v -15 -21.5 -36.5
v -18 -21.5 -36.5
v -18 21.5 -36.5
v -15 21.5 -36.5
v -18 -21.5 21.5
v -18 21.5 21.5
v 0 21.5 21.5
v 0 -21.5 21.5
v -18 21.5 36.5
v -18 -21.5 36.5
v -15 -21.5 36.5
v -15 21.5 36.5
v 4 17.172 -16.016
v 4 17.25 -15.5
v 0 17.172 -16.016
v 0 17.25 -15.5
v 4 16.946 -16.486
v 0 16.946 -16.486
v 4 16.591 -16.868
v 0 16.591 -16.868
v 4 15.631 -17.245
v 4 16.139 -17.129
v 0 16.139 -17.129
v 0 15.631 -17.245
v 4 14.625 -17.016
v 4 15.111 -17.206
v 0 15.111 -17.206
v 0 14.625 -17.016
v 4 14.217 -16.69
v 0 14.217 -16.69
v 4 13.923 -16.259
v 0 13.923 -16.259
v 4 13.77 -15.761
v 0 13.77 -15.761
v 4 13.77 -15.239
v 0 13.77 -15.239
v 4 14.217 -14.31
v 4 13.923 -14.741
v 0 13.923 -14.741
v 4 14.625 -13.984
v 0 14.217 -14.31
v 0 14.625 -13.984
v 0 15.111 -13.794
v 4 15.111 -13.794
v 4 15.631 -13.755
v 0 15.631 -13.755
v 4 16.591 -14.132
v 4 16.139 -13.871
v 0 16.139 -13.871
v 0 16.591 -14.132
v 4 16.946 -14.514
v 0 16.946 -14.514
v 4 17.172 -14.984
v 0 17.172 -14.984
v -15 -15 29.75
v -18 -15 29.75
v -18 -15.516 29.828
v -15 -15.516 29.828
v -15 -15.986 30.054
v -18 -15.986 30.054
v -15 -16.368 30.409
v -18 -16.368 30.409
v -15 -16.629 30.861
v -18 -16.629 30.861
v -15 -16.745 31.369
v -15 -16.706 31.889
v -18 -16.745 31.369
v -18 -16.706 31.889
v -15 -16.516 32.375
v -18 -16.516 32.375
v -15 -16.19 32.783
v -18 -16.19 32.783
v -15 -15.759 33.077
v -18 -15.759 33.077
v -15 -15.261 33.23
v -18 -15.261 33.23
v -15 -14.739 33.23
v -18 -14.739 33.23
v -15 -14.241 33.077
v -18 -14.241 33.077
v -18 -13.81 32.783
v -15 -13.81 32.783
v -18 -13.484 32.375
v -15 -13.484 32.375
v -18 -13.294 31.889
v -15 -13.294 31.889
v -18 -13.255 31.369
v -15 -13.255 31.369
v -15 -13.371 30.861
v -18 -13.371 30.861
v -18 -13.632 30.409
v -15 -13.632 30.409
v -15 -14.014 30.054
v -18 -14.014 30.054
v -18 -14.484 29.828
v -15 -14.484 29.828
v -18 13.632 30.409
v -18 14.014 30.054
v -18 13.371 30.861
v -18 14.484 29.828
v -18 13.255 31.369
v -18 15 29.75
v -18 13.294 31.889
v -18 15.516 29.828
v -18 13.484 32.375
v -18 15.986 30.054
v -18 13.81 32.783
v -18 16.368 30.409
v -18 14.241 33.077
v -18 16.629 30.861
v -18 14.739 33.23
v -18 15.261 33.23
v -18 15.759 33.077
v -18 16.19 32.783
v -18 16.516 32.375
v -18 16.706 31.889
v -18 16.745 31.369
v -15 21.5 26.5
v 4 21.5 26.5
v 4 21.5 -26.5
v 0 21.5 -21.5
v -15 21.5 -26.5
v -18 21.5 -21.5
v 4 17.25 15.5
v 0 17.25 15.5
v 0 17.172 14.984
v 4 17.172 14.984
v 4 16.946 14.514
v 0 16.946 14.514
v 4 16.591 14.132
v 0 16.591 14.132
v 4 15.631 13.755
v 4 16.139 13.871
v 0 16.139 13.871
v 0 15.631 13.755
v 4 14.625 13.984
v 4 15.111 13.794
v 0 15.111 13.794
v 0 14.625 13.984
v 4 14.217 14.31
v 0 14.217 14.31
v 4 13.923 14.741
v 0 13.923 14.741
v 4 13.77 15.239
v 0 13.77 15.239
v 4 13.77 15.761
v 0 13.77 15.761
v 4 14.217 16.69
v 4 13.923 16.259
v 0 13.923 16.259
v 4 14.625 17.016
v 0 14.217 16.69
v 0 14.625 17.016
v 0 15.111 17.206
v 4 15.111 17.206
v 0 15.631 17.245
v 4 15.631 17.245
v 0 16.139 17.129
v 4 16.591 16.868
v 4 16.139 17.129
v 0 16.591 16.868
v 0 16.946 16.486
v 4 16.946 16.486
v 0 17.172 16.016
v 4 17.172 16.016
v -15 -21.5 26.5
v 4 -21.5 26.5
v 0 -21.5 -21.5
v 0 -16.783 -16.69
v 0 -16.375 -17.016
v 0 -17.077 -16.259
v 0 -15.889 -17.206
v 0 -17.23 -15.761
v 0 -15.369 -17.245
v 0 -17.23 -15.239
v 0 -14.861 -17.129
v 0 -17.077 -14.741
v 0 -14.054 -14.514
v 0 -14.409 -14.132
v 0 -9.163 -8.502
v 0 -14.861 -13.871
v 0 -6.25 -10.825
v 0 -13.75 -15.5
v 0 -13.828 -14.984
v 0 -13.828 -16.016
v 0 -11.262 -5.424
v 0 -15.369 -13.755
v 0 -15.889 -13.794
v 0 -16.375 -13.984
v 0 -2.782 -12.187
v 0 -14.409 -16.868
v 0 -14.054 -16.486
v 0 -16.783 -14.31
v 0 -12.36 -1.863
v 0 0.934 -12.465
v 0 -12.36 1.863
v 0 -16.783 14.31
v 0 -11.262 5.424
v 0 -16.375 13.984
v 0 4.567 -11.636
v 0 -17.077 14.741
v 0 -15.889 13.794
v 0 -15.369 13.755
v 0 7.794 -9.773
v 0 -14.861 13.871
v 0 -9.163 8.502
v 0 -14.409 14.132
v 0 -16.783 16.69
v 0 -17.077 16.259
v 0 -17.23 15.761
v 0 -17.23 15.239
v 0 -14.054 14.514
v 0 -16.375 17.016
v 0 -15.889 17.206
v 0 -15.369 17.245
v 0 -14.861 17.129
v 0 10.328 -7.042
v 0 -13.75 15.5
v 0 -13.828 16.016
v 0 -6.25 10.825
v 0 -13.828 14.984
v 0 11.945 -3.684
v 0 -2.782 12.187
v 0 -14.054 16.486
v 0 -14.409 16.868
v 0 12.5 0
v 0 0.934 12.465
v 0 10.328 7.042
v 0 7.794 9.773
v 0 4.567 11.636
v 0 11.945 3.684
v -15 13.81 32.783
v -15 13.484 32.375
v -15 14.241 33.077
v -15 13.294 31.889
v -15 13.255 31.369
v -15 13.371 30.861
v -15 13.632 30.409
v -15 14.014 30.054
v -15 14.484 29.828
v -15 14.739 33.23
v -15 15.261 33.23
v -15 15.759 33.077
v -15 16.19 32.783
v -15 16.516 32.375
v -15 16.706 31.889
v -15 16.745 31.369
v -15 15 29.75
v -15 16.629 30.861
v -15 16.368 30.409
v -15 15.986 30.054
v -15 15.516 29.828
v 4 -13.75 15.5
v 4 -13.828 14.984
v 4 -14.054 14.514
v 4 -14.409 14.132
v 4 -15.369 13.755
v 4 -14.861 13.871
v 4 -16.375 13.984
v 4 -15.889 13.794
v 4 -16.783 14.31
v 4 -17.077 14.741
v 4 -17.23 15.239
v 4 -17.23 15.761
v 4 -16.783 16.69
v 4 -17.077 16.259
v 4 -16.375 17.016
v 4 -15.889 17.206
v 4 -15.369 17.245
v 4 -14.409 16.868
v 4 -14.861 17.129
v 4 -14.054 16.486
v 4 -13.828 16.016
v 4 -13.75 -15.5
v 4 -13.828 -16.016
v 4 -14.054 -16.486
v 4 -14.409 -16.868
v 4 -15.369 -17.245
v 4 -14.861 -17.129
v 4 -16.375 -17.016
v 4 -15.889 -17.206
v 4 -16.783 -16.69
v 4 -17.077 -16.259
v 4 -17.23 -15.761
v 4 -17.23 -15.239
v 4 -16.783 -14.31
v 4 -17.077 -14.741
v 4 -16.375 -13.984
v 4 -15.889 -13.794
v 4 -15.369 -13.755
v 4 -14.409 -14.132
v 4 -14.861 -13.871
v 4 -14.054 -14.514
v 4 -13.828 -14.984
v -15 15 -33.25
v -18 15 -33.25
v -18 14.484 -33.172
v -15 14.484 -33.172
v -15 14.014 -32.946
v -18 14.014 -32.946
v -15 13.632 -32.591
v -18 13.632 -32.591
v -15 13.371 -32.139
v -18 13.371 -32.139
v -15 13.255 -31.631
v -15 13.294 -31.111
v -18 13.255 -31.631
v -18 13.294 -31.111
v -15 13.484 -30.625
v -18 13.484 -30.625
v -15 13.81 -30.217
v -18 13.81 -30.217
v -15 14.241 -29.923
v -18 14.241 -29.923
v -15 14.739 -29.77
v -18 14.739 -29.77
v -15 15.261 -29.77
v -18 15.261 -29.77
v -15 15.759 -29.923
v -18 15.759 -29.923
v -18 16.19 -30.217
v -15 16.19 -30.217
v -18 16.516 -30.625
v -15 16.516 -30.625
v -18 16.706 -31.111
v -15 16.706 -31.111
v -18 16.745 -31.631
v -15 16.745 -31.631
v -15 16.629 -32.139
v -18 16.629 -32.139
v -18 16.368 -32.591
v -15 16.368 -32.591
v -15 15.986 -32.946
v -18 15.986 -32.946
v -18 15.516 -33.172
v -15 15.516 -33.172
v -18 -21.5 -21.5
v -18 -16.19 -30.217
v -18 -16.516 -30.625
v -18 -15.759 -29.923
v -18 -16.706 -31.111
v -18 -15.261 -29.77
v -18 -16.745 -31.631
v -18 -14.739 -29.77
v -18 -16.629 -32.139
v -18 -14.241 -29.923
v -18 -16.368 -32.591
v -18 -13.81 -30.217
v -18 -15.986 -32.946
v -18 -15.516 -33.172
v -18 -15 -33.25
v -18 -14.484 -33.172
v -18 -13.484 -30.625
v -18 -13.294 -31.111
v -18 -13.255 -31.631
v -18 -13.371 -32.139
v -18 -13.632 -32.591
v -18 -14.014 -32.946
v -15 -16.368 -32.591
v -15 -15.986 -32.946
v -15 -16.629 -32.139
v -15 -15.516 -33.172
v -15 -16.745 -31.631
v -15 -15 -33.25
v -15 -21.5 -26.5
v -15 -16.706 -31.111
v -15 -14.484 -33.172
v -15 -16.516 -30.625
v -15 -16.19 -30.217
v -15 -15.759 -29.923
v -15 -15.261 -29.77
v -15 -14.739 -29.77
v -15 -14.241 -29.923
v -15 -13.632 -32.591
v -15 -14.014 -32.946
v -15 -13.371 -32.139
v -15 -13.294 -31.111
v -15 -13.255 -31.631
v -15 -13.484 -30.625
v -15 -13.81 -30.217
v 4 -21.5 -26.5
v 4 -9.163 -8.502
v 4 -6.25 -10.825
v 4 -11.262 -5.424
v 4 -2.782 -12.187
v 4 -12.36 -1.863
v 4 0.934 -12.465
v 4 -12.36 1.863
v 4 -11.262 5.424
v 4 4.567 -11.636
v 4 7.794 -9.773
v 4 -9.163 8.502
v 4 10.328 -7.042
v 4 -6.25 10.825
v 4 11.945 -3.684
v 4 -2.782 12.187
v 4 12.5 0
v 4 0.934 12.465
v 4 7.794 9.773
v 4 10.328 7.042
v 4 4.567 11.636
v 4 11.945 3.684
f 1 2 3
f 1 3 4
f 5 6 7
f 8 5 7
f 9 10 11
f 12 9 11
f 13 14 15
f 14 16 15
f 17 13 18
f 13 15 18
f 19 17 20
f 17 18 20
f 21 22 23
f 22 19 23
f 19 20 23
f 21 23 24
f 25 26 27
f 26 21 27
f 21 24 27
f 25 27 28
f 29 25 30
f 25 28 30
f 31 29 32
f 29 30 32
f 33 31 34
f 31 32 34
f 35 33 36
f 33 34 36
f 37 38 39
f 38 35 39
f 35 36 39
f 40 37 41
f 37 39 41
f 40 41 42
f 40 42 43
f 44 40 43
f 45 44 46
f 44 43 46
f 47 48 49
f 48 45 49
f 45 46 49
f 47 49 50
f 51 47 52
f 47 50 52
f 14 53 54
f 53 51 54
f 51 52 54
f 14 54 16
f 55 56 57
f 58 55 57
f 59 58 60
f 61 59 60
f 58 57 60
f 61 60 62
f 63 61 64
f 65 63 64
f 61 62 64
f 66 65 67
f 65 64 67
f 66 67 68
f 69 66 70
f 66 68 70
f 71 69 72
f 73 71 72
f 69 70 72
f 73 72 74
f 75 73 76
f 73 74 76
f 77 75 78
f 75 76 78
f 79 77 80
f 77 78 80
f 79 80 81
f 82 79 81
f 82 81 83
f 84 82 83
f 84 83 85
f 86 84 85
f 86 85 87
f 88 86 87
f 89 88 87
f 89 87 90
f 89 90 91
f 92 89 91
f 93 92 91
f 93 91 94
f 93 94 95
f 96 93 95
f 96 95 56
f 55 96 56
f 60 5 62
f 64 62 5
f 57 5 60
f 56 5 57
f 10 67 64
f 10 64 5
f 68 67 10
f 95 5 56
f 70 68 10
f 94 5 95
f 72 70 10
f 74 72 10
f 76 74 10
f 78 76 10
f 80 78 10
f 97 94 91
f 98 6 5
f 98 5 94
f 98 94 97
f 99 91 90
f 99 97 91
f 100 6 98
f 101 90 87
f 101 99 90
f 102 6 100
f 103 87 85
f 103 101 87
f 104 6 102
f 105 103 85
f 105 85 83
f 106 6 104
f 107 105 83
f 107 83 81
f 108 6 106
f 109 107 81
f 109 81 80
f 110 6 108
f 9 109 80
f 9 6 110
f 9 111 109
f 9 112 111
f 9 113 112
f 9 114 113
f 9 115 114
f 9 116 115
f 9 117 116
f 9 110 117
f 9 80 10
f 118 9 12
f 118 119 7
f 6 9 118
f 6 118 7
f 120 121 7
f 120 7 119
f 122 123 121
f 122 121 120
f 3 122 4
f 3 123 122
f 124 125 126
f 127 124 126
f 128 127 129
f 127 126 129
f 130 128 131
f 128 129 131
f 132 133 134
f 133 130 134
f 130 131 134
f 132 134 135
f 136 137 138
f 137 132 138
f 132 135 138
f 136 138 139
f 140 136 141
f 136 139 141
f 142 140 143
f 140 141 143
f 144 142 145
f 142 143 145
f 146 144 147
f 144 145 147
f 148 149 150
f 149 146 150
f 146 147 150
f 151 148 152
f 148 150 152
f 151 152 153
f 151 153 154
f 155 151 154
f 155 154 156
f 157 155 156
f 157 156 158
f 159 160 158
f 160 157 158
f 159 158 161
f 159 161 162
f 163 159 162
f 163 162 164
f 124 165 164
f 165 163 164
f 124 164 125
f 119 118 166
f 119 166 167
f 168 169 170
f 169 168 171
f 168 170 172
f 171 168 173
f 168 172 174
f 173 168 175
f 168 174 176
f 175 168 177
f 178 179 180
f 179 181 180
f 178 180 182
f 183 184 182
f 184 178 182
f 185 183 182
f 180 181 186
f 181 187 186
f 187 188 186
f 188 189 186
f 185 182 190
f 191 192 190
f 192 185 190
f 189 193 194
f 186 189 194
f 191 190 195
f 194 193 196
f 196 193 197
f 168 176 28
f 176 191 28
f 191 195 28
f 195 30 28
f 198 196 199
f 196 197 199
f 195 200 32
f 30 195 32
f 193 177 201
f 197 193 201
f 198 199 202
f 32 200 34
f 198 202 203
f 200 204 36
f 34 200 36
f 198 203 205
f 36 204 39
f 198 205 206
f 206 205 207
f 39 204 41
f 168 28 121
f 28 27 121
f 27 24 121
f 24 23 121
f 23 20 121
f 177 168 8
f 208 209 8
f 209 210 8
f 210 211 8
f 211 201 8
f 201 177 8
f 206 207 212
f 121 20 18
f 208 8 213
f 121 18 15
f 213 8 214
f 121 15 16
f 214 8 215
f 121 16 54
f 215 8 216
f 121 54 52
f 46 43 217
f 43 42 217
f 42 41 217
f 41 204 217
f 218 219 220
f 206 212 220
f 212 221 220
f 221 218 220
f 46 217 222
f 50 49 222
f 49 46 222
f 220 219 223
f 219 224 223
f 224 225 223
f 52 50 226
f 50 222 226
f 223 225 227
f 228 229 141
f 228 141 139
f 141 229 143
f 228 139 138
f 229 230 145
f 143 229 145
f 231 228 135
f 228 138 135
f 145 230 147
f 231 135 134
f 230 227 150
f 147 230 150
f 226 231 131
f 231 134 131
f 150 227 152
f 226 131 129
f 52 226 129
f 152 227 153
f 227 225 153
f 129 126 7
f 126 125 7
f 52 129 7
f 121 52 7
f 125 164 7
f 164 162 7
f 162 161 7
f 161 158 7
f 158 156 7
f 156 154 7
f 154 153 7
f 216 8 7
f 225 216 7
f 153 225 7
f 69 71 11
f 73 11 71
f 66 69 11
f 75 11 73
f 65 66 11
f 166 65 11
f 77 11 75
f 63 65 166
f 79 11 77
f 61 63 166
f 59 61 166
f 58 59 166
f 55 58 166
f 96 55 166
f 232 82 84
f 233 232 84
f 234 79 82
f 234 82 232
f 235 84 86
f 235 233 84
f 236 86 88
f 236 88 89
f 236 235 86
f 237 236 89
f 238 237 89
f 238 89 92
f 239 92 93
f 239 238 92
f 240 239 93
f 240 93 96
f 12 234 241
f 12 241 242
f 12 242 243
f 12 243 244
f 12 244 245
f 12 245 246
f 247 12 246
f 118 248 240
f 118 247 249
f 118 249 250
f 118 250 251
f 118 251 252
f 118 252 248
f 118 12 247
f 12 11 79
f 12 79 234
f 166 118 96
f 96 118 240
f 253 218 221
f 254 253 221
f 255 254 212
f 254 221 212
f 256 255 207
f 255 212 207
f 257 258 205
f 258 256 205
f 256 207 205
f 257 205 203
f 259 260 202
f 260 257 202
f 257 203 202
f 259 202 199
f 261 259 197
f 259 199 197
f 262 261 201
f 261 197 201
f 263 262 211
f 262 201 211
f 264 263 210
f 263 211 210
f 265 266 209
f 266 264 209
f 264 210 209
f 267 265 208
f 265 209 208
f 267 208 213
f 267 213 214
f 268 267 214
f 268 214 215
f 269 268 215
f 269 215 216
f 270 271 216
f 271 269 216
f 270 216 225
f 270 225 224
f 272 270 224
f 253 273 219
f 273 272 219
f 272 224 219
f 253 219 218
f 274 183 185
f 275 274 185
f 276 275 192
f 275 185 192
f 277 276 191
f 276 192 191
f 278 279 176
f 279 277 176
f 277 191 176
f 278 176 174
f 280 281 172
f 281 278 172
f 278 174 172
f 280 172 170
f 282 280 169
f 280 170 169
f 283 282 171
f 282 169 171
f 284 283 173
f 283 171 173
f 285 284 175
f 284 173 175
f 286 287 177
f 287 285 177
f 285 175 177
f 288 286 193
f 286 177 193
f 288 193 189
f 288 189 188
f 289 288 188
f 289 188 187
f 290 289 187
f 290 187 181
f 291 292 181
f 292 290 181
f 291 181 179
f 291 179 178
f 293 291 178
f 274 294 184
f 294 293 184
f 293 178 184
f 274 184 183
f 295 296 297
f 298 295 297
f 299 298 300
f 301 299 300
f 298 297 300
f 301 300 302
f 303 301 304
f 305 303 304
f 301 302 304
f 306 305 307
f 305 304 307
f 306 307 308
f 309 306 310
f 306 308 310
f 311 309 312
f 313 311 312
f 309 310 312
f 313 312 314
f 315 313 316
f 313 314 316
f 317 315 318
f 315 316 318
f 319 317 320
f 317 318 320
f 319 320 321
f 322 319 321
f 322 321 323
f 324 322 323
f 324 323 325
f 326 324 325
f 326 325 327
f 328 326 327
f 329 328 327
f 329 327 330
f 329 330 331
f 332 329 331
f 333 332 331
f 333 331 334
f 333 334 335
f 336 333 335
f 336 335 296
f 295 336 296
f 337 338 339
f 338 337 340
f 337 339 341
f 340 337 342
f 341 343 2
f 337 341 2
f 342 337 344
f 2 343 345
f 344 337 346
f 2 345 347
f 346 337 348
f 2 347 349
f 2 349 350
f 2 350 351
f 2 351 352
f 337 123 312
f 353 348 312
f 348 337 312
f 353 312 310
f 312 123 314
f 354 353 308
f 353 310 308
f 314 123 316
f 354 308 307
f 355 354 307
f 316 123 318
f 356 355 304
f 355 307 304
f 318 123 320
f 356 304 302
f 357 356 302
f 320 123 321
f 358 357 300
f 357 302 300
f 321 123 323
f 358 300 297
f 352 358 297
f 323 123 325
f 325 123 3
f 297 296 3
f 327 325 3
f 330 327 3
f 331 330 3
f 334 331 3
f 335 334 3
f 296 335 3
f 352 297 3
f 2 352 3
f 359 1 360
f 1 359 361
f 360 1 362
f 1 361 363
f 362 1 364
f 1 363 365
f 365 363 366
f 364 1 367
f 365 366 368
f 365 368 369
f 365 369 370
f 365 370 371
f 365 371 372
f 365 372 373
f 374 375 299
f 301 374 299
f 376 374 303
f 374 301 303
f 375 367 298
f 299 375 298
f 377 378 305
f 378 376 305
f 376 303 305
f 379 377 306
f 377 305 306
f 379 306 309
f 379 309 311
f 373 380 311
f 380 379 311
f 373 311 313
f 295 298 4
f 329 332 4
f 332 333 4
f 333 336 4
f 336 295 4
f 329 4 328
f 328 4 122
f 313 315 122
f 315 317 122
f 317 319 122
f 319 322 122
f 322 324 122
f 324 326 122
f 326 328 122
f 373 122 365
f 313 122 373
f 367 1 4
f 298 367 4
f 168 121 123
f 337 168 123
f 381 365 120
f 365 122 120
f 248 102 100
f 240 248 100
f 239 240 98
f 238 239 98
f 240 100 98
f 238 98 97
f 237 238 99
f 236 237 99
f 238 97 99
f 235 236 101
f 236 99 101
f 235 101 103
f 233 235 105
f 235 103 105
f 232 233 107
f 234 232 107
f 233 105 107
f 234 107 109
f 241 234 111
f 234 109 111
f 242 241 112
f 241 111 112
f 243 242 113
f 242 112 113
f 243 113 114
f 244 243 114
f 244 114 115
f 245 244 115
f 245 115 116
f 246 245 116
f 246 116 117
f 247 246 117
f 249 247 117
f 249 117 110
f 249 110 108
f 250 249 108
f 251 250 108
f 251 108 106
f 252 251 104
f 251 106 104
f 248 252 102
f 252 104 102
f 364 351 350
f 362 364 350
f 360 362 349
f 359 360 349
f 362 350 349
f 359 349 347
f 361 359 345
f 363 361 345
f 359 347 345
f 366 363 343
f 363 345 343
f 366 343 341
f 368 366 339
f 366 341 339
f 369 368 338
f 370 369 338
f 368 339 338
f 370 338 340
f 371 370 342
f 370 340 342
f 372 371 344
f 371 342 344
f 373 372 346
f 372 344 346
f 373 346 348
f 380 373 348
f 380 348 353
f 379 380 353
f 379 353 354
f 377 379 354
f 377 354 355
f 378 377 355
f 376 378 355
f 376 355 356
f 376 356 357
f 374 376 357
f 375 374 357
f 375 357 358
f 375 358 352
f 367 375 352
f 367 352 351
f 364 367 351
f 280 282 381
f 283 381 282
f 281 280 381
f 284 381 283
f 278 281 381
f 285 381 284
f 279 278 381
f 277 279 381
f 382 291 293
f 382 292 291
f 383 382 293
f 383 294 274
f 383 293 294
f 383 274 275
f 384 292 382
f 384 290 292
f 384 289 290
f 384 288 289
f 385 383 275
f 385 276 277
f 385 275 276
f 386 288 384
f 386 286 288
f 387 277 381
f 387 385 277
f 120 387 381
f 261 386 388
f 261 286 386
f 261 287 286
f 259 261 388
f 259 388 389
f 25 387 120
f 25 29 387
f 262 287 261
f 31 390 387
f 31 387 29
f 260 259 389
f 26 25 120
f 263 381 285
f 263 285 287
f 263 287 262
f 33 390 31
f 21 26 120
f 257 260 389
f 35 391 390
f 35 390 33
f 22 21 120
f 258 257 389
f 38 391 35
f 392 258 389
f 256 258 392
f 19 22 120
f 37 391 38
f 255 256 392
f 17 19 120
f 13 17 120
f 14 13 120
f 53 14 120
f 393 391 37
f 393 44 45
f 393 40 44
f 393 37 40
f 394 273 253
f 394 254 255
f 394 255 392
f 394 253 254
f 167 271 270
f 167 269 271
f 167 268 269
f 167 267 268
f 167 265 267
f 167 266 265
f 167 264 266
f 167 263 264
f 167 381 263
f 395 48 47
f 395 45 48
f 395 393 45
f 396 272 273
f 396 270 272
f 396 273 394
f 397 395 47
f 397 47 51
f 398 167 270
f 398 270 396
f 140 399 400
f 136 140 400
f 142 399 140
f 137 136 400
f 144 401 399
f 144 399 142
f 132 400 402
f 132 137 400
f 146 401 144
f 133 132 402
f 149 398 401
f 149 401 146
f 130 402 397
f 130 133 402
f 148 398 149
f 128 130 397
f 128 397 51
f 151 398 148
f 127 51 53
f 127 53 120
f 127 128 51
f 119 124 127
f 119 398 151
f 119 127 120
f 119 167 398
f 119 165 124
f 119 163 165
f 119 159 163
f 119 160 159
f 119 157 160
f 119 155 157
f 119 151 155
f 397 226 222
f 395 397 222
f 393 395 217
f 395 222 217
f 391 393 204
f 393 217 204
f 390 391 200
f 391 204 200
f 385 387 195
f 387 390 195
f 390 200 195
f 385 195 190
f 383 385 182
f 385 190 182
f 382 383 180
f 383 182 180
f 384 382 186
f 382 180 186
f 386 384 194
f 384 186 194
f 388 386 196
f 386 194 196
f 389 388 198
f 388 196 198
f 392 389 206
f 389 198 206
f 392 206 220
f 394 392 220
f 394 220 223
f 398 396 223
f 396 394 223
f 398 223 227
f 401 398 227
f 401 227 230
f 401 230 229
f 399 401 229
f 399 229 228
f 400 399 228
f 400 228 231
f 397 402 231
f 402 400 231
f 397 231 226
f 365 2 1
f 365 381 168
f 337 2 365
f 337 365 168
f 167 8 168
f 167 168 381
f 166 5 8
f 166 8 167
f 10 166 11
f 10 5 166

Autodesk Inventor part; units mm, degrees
ref_plane "YZ Plane" through (0, 0, 0) normal (1, 0, 0) x (0, 1, 0)
ref_plane "XZ Plane" through (0, 0, 0) normal (0, 1, 0) x (-1, 0, 0)
ref_plane "XY Plane" through (0, 0, 0) normal (0, 0, 1) x (1, 0, 0)
sketch "Sketch1" plane through (0, 0, 0) normal (1, 0, 0) x (0, 1, 0)
  circle A0 centre (0, 0) radius 12.5
  circle A1 centre (-15.5, -15.5) radius 1.75
  circle A2 centre (15.5, -15.5) radius 1.75
  circle A3 centre (15.5, 15.5) radius 1.75
  circle A4 centre (-15.5, 15.5) radius 1.75
  line L0 (21.5, -21.5) -> (-21.5, -21.5)
  line L1 (-21.5, -21.5) -> (-21.5, 21.5)
  line L2 (-21.5, 21.5) -> (21.5, 21.5)
  line L3 (21.5, 21.5) -> (21.5, -21.5)
  line L4 (21.5, -21.5) -> (-21.5, 21.5) construction
  line L5 (-21.5, -21.5) -> (21.5, 21.5) construction
  dimension "d2" = 360
  dimension "d4" = 3.5
  dimension "d5" = 25
  dimension "d6" = 31
  dimension "d7" = 43
extrude "Extrusion1" add sketch "Sketch1" along normal blind 4
sketch "Sketch5" plane through (0, 21.5, 21.5) normal (0, 1, 0) x (1, 0, 0)
  line L0 (0, 43) -> (0, 0) projected
  line L1 (0, 0) -> (4, 0) projected
  line L2 (4, 43) -> (4, 0) projected
  line L3 (0, 43) -> (4, 43) projected
  line L4 (0, 43) -> (4, 43) projected
  line L5 (0, 43) -> (-18, 43)
  line L6 (-18, 43) -> (-18, 58)
  line L7 (-18, 58) -> (-15, 58)
  line L8 (-15, 58) -> (-15, 48)
  line L9 (-15, 48) -> (4, 48)
  line L10 (4, 48) -> (4, 43)
  line L11 (0, 0) -> (-18, 0)
  line L12 (-18, 0) -> (-18, -15)
  line L13 (-18, -15) -> (-15, -15)
  line L14 (-15, -15) -> (-15, -5)
  line L15 (-15, -5) -> (4, -5)
  line L16 (4, -5) -> (4, 0)
  line L17 (4, 43) -> (4, 0) projected
  point P0 (0, 21.5)
  dimension "d17" = 5
  dimension "d18" = 3
  dimension "d19" = 10
  dimension "d23" = 22
extrude "Extrusion4" add sketch "Sketch5" against normal up to surface (43 mm away) contours L5 L6 L7 L8 L9 L10 L3 | L1 L16 L15 L14 L13 L12 L11
sketch "Sketch6" plane through (-15, 21.5, 36.5) normal (1, 0, 0) x (0, 0, -1)
  line L0 (0, -43) -> (10, -43) projected
  line L1 (10, 0) -> (10, -43) projected
  line L2 (0, 0) -> (10, 0) projected
  line L3 (0, 0) -> (0, -43) projected
  line L4 (63, -43) -> (73, -43) projected
  line L5 (73, 0) -> (73, -43) projected
  line L6 (63, 0) -> (73, 0) projected
  line L7 (63, 0) -> (63, -43) projected
  point P0 (36.5, -21.5)
  point P1 (5, -6.5)
  point P2 (5, -36.5)
  point P3 (68, -36.5)
  point P4 (68, -6.5)
  point P5 (5, 0)
  point P6 (5, -43)
  point P7 (68, -43)
  point P8 (68, 0)
  dimension "d24" = 6.5
  dimension "d25" = 6.5
  dimension "d26" = 30
hole "Hole1" at (-15, 15, 31.5) at (-15, -15, 31.5) at (-15, -15, -31.5) at (-15, 15, -31.5) direction (-1, 0, 0) diameter 3.5 end through all
equation "\"d25\" = d24"
properties part number "Z Axis Motor Bracket" material "ABS Plastic"
